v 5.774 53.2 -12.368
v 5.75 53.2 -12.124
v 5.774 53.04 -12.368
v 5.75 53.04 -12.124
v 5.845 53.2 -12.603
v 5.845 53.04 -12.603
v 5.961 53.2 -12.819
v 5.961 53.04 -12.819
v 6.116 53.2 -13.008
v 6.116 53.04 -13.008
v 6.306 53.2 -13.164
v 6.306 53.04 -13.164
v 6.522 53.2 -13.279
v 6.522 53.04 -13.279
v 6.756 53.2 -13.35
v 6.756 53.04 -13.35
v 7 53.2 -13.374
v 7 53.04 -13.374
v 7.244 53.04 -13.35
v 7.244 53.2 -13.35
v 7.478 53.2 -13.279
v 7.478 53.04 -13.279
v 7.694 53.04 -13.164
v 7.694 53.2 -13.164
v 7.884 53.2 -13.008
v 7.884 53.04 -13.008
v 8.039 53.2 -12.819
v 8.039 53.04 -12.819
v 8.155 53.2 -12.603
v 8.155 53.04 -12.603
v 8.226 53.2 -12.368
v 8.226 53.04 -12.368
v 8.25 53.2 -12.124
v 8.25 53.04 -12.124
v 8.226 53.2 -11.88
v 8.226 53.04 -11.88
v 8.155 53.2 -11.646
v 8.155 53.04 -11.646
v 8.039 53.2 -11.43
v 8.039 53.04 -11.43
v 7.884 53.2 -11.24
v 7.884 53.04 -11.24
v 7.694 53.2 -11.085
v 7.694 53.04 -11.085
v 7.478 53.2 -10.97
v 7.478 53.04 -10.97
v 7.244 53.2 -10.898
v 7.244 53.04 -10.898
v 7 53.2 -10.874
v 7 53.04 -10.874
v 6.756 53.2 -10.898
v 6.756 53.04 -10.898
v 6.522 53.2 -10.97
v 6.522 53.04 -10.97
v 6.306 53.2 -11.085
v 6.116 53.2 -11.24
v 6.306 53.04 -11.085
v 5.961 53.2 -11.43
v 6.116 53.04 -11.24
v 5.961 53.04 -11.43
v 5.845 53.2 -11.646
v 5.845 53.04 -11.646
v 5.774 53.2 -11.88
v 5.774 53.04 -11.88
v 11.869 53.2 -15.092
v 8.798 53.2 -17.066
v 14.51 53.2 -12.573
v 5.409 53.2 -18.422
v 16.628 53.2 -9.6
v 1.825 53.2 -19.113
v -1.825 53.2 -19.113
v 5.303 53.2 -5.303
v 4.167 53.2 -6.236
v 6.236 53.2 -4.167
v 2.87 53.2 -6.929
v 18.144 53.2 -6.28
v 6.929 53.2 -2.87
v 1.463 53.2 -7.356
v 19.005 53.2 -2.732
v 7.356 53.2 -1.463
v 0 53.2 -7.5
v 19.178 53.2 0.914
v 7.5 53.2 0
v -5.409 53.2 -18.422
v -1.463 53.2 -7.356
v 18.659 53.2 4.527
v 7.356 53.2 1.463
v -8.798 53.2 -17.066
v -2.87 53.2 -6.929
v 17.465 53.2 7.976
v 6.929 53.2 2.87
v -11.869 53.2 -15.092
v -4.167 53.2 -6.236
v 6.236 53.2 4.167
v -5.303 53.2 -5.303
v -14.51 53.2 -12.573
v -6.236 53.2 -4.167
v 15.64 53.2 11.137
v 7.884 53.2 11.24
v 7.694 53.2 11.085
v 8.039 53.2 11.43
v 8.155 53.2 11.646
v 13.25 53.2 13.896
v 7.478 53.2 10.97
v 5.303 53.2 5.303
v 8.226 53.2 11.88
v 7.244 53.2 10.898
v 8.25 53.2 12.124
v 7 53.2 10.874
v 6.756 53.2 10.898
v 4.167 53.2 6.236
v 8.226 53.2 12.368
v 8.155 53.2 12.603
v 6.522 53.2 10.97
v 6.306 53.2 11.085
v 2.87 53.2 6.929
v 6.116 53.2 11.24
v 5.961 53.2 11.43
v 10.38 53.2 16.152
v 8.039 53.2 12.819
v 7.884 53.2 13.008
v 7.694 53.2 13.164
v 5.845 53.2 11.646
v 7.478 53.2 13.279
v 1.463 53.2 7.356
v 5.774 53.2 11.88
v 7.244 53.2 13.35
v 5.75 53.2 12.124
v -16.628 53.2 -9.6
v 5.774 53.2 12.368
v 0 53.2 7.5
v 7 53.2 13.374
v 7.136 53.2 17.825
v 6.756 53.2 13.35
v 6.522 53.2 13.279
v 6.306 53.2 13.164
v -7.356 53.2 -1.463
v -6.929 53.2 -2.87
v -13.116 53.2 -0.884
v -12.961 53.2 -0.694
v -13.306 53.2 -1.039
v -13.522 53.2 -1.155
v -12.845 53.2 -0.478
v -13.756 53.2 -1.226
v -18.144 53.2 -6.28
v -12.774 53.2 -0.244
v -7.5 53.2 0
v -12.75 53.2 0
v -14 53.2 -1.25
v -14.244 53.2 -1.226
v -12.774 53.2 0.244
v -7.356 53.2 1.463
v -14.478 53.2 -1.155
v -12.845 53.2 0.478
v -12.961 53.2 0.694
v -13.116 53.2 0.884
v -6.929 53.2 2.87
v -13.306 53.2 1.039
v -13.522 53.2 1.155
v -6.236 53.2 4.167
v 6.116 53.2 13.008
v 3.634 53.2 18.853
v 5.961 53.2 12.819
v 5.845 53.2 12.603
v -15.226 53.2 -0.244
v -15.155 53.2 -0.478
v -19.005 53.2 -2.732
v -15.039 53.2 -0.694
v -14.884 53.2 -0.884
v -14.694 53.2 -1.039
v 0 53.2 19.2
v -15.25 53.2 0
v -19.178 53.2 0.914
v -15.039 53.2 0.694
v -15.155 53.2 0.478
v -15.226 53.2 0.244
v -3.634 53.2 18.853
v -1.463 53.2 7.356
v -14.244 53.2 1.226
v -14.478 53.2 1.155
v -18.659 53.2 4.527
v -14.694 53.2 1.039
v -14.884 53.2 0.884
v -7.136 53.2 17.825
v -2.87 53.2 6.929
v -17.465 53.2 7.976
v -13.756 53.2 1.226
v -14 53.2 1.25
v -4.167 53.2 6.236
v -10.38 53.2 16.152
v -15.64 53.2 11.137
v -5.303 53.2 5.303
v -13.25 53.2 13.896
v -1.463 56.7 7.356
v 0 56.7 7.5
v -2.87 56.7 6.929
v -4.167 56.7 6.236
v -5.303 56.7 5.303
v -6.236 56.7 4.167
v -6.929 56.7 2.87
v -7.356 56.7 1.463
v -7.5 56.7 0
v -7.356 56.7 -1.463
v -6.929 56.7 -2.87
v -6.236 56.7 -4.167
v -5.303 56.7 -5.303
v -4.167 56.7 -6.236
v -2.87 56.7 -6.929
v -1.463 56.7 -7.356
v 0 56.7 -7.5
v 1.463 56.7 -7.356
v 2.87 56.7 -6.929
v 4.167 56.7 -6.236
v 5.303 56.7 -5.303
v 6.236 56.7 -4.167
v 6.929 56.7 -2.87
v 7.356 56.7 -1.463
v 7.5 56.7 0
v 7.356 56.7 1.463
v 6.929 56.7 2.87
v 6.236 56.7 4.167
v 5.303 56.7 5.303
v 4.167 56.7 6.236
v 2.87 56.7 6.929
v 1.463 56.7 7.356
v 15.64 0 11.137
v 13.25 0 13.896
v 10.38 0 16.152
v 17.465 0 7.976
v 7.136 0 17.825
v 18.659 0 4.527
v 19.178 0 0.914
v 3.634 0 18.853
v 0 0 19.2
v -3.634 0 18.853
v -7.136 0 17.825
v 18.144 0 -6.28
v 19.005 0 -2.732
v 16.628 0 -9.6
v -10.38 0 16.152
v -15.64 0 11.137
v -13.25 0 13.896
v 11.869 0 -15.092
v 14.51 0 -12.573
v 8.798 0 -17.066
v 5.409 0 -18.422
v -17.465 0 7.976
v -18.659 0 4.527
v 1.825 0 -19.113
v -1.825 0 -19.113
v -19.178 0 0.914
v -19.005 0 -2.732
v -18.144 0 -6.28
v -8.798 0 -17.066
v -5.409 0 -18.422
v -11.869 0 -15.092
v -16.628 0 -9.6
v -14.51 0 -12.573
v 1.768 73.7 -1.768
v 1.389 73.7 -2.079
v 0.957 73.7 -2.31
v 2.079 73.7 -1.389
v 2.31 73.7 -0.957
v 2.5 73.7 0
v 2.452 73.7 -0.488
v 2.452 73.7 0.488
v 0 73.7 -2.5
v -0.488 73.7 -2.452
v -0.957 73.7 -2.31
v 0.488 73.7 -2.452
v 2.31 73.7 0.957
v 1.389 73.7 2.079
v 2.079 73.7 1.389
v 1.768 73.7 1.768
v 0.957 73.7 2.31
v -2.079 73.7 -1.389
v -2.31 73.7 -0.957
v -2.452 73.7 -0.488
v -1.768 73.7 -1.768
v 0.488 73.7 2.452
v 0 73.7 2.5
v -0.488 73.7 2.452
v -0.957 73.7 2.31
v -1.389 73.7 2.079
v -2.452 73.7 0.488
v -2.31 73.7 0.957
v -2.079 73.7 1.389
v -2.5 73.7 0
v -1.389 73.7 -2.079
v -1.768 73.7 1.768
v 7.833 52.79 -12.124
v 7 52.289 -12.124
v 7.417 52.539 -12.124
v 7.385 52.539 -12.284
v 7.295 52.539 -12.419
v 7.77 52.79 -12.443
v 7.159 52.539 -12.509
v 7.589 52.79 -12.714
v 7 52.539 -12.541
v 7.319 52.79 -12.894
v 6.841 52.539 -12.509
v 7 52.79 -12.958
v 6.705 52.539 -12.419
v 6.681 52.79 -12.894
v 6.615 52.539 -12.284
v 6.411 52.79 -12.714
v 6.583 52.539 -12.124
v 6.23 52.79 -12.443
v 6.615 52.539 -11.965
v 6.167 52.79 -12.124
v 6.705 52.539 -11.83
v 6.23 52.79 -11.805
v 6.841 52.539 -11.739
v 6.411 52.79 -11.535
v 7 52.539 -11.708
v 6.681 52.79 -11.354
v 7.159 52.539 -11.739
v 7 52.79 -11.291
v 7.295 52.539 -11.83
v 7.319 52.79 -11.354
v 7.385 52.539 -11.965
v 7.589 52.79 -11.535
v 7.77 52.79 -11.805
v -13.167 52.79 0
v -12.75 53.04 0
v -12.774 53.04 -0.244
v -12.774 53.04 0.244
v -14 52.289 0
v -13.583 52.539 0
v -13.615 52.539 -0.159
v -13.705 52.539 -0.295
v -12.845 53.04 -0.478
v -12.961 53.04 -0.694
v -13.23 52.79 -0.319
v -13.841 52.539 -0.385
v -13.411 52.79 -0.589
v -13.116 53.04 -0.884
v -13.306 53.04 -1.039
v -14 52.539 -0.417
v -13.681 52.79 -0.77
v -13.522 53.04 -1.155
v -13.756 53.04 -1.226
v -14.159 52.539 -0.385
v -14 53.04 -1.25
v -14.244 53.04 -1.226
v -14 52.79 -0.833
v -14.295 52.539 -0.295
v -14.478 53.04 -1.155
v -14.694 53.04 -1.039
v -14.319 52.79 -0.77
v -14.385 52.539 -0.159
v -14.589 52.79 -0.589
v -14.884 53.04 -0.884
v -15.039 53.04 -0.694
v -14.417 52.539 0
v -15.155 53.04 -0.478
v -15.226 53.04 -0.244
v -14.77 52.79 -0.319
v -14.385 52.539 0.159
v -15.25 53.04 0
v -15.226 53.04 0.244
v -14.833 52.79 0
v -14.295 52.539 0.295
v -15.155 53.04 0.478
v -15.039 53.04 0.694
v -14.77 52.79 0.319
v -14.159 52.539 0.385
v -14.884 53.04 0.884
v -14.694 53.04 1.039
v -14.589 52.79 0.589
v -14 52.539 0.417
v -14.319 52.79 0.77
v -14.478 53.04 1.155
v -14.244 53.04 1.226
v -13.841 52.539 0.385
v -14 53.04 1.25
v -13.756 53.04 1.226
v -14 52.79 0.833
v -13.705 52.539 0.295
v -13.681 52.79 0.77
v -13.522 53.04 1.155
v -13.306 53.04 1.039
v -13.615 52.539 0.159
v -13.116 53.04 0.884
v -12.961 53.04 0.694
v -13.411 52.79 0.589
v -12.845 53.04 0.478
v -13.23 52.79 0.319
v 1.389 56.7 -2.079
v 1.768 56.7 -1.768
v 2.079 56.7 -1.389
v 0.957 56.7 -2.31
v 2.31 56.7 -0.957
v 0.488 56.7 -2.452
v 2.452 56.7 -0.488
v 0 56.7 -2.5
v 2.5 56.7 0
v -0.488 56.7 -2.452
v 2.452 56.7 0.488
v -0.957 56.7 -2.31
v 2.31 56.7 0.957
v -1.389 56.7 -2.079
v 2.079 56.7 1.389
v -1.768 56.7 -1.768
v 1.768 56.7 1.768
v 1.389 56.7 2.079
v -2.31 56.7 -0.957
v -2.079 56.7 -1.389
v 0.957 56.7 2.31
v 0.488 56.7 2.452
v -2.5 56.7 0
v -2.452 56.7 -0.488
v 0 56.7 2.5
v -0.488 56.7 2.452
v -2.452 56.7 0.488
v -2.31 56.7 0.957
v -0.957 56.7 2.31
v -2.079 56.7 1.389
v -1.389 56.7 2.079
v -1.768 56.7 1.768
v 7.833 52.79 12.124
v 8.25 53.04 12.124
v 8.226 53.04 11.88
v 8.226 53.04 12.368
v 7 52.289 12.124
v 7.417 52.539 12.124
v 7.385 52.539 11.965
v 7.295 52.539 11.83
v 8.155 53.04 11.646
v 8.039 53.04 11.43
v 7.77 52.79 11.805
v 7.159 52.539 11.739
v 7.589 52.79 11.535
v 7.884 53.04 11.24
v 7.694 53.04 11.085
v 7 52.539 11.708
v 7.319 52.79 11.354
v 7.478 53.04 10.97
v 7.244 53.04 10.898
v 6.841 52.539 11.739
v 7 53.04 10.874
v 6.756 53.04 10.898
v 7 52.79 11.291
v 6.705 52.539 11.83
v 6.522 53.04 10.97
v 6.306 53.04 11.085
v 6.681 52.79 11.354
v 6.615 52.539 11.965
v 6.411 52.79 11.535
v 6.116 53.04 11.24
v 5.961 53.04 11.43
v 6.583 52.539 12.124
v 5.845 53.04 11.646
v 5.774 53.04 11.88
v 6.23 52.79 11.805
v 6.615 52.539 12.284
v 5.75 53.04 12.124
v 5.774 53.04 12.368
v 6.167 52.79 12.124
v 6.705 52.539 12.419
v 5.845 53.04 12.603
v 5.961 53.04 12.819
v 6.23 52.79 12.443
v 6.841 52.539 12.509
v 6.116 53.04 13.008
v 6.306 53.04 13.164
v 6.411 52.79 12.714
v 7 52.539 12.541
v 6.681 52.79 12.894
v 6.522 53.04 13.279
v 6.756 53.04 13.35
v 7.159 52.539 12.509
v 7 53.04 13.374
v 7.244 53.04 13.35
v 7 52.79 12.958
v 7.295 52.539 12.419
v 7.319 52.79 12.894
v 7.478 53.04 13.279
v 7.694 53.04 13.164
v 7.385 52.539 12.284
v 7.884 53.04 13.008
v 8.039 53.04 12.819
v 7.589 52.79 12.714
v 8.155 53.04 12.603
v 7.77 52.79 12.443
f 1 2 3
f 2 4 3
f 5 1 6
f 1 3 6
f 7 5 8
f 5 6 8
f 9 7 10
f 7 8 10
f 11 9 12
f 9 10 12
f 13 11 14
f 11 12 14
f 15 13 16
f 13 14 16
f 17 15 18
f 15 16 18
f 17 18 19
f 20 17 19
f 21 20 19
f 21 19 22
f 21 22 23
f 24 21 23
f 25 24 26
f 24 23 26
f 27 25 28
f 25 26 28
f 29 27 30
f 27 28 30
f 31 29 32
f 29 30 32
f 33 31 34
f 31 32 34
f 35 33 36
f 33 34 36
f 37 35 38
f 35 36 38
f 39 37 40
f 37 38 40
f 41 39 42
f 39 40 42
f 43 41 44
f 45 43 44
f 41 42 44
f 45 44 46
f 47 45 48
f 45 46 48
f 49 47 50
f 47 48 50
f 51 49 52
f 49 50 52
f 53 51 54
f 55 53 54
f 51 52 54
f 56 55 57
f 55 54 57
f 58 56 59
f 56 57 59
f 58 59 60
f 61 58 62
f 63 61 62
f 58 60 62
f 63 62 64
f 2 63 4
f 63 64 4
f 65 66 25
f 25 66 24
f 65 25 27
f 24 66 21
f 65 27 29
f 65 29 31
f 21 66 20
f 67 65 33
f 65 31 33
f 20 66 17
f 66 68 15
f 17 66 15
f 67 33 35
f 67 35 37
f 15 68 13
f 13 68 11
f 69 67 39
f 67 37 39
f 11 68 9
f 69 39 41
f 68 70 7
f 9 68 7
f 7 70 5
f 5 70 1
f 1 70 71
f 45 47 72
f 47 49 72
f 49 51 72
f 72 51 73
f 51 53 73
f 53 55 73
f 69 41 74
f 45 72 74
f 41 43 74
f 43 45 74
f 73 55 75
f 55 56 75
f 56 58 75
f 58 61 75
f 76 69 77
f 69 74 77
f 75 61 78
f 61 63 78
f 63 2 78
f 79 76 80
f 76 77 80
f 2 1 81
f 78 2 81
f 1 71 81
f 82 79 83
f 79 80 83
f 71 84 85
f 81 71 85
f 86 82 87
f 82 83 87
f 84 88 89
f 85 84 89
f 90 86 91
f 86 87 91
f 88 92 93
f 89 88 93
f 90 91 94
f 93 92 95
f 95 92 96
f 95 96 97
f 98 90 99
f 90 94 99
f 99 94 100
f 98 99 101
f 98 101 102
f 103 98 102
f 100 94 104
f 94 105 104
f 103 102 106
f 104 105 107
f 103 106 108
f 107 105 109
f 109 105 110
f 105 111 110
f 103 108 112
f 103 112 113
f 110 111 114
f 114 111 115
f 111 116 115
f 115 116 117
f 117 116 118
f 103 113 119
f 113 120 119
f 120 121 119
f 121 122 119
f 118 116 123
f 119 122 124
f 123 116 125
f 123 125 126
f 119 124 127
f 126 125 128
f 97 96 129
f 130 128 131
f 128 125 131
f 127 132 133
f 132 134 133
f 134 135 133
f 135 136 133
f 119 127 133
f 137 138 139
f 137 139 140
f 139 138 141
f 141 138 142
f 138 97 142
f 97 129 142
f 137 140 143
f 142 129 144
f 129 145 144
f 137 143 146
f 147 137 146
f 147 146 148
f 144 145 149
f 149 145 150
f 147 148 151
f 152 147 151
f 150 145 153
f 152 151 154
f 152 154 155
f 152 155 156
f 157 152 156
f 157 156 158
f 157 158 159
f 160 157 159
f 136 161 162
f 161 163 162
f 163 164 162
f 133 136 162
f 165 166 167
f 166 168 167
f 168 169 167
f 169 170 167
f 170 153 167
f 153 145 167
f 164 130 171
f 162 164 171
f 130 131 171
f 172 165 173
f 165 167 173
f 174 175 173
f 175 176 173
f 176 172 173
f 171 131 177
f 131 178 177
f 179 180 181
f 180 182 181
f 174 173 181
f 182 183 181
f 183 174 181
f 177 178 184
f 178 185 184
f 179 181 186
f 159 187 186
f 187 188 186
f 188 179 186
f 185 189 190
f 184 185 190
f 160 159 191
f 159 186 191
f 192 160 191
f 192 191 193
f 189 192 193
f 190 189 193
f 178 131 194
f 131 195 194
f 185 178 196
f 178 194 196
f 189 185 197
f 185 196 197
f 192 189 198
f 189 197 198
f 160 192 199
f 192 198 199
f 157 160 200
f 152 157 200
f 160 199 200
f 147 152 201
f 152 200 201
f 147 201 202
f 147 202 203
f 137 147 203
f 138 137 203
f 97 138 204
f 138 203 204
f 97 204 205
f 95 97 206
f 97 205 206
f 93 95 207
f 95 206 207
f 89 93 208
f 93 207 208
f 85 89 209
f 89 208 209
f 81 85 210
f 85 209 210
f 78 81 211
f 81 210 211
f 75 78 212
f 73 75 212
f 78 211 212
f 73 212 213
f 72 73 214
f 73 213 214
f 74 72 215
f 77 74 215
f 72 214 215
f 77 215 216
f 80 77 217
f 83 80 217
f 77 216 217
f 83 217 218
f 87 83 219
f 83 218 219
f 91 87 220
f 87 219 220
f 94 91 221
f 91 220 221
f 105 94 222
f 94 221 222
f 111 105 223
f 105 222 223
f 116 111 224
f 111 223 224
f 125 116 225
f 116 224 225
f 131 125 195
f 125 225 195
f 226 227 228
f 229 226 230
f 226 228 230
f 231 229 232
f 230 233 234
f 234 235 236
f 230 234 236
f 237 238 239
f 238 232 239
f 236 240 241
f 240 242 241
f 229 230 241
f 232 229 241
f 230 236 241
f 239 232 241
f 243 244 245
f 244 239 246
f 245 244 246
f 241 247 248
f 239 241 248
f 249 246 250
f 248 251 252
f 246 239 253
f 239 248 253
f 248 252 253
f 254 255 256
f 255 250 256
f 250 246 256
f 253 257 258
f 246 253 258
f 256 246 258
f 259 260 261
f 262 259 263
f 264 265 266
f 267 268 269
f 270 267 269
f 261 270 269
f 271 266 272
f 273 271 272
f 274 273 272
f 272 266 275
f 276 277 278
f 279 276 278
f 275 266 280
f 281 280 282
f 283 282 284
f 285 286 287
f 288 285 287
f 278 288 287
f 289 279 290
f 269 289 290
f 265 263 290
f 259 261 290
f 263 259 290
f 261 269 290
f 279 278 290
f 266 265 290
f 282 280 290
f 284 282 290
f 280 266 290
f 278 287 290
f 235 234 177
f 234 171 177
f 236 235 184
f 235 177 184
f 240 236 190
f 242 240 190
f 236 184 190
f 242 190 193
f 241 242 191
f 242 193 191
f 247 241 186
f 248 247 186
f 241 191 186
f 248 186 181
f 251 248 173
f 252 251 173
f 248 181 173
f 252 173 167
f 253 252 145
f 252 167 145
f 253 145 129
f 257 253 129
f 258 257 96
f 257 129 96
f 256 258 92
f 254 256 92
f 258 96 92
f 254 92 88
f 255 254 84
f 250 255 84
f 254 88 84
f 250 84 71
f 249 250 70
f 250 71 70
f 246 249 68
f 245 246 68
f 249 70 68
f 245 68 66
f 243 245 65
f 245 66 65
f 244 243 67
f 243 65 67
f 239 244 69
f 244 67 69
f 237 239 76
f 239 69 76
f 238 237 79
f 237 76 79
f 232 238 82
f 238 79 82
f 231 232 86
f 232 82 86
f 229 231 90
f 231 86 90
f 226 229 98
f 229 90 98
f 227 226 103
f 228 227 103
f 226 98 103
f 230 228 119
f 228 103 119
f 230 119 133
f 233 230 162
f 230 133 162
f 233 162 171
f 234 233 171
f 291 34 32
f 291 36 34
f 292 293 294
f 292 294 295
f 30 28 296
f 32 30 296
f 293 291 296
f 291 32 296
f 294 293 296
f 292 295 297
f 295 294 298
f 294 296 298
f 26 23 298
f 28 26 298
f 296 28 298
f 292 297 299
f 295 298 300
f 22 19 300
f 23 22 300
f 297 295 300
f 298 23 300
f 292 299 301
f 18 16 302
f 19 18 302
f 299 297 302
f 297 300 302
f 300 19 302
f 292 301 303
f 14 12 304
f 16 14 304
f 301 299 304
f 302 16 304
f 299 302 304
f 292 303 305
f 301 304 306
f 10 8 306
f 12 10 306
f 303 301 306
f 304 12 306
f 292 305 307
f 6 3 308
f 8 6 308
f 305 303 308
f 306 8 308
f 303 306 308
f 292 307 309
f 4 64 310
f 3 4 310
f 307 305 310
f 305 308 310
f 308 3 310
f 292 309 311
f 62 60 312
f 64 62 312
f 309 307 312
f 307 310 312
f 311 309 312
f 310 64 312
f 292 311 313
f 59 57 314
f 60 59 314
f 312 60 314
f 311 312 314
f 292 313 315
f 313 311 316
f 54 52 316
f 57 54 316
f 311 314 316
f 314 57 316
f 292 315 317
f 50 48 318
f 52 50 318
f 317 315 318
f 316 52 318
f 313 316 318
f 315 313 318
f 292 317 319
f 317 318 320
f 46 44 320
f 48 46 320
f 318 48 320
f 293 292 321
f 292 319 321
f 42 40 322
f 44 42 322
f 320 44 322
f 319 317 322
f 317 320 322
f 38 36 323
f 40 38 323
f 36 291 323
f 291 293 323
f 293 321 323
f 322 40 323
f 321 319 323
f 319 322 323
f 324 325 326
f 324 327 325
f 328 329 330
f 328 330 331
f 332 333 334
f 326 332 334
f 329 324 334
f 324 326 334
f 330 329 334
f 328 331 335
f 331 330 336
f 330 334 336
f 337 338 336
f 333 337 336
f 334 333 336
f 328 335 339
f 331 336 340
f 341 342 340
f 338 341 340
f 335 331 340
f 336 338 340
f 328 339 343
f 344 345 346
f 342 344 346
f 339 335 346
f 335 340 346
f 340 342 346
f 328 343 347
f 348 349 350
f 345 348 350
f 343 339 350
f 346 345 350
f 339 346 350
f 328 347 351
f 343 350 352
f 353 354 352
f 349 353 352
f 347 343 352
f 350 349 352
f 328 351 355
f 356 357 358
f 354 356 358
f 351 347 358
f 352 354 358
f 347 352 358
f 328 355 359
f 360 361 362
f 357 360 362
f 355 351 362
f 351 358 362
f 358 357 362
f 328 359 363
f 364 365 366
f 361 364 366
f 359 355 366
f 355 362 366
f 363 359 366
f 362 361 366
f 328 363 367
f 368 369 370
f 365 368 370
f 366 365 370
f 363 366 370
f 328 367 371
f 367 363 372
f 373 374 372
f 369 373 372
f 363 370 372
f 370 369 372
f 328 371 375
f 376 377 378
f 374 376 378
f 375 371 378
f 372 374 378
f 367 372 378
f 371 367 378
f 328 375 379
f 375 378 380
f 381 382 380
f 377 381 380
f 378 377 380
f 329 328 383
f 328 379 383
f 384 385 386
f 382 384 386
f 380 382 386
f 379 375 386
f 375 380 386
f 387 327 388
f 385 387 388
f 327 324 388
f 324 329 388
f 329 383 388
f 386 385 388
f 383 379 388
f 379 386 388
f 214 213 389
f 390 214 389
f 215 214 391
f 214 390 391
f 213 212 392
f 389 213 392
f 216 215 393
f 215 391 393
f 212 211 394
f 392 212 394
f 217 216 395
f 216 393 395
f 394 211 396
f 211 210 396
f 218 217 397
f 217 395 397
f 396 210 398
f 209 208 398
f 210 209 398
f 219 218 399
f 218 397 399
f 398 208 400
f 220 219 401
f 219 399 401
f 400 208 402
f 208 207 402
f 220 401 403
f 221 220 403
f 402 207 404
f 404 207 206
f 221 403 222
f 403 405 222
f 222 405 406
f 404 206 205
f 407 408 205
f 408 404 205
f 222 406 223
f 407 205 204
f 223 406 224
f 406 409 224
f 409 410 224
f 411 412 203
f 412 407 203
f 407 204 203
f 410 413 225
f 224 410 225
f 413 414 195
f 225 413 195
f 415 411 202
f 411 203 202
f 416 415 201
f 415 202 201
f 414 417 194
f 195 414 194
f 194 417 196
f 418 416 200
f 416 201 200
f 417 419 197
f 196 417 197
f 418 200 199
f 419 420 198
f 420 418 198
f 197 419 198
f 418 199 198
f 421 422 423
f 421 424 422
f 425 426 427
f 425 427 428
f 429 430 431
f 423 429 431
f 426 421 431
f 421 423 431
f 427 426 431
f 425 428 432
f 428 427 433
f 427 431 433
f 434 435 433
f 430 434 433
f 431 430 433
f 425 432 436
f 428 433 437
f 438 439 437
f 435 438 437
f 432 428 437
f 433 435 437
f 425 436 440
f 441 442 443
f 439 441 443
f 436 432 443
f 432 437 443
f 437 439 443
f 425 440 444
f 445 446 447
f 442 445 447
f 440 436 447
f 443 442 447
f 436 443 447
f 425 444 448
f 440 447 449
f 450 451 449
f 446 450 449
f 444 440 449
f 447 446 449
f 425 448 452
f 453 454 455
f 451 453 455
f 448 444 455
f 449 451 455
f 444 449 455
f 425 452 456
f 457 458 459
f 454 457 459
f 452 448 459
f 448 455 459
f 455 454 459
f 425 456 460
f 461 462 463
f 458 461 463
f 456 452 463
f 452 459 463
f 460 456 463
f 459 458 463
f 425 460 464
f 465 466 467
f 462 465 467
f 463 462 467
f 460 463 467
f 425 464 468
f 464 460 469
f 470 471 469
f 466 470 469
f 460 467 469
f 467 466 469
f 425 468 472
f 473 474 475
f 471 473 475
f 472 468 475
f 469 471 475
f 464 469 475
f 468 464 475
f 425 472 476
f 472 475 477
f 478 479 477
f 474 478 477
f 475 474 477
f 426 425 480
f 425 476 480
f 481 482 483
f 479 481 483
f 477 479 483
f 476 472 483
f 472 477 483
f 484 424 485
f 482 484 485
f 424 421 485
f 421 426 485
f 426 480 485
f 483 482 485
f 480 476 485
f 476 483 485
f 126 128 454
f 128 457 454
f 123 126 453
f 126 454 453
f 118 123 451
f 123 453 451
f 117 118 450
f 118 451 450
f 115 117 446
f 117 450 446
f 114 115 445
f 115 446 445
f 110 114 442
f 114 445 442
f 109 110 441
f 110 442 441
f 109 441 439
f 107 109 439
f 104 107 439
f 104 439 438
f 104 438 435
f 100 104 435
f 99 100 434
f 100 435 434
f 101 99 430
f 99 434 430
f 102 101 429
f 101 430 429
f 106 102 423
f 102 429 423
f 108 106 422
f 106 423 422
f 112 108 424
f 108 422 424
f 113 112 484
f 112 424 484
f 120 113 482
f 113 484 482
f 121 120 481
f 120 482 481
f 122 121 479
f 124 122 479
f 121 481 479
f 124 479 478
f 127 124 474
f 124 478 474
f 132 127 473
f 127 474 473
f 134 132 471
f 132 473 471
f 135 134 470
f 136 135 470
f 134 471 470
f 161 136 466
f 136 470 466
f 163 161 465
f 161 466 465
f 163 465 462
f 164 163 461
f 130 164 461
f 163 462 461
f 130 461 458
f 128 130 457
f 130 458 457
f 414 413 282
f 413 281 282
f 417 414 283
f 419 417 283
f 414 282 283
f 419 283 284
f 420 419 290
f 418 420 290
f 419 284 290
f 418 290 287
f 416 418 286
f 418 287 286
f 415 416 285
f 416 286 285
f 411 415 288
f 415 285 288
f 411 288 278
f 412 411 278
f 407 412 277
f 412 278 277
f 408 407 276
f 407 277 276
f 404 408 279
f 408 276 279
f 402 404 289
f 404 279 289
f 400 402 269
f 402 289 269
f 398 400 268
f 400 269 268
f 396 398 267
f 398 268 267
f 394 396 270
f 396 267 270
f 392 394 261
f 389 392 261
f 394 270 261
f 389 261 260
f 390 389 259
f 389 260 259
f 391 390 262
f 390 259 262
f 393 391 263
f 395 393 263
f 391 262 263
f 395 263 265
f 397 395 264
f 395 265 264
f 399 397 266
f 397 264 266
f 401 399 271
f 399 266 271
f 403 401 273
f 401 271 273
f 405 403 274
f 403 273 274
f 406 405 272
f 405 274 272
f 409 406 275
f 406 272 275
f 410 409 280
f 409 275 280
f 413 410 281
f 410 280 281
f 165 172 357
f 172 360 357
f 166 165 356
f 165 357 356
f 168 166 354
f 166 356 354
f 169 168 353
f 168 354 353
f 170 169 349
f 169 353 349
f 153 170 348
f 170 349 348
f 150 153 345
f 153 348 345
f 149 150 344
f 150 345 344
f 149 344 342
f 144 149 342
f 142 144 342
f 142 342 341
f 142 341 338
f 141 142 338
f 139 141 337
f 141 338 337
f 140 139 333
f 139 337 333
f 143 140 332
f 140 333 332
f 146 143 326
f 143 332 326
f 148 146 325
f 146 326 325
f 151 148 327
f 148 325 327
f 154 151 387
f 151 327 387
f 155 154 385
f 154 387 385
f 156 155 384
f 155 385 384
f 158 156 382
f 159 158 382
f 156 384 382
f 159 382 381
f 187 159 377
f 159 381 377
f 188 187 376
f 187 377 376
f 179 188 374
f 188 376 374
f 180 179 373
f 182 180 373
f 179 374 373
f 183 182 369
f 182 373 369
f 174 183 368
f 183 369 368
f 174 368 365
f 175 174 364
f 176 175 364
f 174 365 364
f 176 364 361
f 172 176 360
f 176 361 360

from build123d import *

# Parameters (mm, degrees)
M3_TAPPED_HOLE1_D     = 2.5
M3_TAPPED_HOLE1_DEPTH = 0.16
M3_TAPPED_HOLE1_TIP   = 0.751075774


with BuildPart() as part:
    # Sketch1 → Revolve1 (revolve)
    with BuildSketch(Plane(origin=(0, 0, 0), x_dir=(0, 0, -1), z_dir=(1, 0, 0)), mode=Mode.PRIVATE) as revolve1_sk:
        Polygon((0, 0), (19.2, 0), (19.2, 53.2), (7.5, 53.2), (7.5, 56.7), (2.5, 56.7), (2.5, 73.7), (0, 73.7), align=None)
    revolve(revolve1_sk.sketch.rotate(Axis((0, 33.970588235, 0), (0, -1, 0)), 180), axis=Axis((0, 33.970588235, 0), (0, -1, 0)))

    # M3 Tapped Hole1
    with Locations(Plane(origin=(0, 53.2, 0), x_dir=(1, 0, 0), z_dir=(0, 1, 0))):
        with Locations((7, 12.124355653), (7, -12.124355653), (-14, 0)):
            Hole(M3_TAPPED_HOLE1_D / 2, depth=M3_TAPPED_HOLE1_DEPTH)
            with Locations((0, 0, -(M3_TAPPED_HOLE1_DEPTH + M3_TAPPED_HOLE1_TIP / 2))):  # 118° drill point
                Cone(0, M3_TAPPED_HOLE1_D / 2, M3_TAPPED_HOLE1_TIP, mode=Mode.SUBTRACT)


solid = part.part
